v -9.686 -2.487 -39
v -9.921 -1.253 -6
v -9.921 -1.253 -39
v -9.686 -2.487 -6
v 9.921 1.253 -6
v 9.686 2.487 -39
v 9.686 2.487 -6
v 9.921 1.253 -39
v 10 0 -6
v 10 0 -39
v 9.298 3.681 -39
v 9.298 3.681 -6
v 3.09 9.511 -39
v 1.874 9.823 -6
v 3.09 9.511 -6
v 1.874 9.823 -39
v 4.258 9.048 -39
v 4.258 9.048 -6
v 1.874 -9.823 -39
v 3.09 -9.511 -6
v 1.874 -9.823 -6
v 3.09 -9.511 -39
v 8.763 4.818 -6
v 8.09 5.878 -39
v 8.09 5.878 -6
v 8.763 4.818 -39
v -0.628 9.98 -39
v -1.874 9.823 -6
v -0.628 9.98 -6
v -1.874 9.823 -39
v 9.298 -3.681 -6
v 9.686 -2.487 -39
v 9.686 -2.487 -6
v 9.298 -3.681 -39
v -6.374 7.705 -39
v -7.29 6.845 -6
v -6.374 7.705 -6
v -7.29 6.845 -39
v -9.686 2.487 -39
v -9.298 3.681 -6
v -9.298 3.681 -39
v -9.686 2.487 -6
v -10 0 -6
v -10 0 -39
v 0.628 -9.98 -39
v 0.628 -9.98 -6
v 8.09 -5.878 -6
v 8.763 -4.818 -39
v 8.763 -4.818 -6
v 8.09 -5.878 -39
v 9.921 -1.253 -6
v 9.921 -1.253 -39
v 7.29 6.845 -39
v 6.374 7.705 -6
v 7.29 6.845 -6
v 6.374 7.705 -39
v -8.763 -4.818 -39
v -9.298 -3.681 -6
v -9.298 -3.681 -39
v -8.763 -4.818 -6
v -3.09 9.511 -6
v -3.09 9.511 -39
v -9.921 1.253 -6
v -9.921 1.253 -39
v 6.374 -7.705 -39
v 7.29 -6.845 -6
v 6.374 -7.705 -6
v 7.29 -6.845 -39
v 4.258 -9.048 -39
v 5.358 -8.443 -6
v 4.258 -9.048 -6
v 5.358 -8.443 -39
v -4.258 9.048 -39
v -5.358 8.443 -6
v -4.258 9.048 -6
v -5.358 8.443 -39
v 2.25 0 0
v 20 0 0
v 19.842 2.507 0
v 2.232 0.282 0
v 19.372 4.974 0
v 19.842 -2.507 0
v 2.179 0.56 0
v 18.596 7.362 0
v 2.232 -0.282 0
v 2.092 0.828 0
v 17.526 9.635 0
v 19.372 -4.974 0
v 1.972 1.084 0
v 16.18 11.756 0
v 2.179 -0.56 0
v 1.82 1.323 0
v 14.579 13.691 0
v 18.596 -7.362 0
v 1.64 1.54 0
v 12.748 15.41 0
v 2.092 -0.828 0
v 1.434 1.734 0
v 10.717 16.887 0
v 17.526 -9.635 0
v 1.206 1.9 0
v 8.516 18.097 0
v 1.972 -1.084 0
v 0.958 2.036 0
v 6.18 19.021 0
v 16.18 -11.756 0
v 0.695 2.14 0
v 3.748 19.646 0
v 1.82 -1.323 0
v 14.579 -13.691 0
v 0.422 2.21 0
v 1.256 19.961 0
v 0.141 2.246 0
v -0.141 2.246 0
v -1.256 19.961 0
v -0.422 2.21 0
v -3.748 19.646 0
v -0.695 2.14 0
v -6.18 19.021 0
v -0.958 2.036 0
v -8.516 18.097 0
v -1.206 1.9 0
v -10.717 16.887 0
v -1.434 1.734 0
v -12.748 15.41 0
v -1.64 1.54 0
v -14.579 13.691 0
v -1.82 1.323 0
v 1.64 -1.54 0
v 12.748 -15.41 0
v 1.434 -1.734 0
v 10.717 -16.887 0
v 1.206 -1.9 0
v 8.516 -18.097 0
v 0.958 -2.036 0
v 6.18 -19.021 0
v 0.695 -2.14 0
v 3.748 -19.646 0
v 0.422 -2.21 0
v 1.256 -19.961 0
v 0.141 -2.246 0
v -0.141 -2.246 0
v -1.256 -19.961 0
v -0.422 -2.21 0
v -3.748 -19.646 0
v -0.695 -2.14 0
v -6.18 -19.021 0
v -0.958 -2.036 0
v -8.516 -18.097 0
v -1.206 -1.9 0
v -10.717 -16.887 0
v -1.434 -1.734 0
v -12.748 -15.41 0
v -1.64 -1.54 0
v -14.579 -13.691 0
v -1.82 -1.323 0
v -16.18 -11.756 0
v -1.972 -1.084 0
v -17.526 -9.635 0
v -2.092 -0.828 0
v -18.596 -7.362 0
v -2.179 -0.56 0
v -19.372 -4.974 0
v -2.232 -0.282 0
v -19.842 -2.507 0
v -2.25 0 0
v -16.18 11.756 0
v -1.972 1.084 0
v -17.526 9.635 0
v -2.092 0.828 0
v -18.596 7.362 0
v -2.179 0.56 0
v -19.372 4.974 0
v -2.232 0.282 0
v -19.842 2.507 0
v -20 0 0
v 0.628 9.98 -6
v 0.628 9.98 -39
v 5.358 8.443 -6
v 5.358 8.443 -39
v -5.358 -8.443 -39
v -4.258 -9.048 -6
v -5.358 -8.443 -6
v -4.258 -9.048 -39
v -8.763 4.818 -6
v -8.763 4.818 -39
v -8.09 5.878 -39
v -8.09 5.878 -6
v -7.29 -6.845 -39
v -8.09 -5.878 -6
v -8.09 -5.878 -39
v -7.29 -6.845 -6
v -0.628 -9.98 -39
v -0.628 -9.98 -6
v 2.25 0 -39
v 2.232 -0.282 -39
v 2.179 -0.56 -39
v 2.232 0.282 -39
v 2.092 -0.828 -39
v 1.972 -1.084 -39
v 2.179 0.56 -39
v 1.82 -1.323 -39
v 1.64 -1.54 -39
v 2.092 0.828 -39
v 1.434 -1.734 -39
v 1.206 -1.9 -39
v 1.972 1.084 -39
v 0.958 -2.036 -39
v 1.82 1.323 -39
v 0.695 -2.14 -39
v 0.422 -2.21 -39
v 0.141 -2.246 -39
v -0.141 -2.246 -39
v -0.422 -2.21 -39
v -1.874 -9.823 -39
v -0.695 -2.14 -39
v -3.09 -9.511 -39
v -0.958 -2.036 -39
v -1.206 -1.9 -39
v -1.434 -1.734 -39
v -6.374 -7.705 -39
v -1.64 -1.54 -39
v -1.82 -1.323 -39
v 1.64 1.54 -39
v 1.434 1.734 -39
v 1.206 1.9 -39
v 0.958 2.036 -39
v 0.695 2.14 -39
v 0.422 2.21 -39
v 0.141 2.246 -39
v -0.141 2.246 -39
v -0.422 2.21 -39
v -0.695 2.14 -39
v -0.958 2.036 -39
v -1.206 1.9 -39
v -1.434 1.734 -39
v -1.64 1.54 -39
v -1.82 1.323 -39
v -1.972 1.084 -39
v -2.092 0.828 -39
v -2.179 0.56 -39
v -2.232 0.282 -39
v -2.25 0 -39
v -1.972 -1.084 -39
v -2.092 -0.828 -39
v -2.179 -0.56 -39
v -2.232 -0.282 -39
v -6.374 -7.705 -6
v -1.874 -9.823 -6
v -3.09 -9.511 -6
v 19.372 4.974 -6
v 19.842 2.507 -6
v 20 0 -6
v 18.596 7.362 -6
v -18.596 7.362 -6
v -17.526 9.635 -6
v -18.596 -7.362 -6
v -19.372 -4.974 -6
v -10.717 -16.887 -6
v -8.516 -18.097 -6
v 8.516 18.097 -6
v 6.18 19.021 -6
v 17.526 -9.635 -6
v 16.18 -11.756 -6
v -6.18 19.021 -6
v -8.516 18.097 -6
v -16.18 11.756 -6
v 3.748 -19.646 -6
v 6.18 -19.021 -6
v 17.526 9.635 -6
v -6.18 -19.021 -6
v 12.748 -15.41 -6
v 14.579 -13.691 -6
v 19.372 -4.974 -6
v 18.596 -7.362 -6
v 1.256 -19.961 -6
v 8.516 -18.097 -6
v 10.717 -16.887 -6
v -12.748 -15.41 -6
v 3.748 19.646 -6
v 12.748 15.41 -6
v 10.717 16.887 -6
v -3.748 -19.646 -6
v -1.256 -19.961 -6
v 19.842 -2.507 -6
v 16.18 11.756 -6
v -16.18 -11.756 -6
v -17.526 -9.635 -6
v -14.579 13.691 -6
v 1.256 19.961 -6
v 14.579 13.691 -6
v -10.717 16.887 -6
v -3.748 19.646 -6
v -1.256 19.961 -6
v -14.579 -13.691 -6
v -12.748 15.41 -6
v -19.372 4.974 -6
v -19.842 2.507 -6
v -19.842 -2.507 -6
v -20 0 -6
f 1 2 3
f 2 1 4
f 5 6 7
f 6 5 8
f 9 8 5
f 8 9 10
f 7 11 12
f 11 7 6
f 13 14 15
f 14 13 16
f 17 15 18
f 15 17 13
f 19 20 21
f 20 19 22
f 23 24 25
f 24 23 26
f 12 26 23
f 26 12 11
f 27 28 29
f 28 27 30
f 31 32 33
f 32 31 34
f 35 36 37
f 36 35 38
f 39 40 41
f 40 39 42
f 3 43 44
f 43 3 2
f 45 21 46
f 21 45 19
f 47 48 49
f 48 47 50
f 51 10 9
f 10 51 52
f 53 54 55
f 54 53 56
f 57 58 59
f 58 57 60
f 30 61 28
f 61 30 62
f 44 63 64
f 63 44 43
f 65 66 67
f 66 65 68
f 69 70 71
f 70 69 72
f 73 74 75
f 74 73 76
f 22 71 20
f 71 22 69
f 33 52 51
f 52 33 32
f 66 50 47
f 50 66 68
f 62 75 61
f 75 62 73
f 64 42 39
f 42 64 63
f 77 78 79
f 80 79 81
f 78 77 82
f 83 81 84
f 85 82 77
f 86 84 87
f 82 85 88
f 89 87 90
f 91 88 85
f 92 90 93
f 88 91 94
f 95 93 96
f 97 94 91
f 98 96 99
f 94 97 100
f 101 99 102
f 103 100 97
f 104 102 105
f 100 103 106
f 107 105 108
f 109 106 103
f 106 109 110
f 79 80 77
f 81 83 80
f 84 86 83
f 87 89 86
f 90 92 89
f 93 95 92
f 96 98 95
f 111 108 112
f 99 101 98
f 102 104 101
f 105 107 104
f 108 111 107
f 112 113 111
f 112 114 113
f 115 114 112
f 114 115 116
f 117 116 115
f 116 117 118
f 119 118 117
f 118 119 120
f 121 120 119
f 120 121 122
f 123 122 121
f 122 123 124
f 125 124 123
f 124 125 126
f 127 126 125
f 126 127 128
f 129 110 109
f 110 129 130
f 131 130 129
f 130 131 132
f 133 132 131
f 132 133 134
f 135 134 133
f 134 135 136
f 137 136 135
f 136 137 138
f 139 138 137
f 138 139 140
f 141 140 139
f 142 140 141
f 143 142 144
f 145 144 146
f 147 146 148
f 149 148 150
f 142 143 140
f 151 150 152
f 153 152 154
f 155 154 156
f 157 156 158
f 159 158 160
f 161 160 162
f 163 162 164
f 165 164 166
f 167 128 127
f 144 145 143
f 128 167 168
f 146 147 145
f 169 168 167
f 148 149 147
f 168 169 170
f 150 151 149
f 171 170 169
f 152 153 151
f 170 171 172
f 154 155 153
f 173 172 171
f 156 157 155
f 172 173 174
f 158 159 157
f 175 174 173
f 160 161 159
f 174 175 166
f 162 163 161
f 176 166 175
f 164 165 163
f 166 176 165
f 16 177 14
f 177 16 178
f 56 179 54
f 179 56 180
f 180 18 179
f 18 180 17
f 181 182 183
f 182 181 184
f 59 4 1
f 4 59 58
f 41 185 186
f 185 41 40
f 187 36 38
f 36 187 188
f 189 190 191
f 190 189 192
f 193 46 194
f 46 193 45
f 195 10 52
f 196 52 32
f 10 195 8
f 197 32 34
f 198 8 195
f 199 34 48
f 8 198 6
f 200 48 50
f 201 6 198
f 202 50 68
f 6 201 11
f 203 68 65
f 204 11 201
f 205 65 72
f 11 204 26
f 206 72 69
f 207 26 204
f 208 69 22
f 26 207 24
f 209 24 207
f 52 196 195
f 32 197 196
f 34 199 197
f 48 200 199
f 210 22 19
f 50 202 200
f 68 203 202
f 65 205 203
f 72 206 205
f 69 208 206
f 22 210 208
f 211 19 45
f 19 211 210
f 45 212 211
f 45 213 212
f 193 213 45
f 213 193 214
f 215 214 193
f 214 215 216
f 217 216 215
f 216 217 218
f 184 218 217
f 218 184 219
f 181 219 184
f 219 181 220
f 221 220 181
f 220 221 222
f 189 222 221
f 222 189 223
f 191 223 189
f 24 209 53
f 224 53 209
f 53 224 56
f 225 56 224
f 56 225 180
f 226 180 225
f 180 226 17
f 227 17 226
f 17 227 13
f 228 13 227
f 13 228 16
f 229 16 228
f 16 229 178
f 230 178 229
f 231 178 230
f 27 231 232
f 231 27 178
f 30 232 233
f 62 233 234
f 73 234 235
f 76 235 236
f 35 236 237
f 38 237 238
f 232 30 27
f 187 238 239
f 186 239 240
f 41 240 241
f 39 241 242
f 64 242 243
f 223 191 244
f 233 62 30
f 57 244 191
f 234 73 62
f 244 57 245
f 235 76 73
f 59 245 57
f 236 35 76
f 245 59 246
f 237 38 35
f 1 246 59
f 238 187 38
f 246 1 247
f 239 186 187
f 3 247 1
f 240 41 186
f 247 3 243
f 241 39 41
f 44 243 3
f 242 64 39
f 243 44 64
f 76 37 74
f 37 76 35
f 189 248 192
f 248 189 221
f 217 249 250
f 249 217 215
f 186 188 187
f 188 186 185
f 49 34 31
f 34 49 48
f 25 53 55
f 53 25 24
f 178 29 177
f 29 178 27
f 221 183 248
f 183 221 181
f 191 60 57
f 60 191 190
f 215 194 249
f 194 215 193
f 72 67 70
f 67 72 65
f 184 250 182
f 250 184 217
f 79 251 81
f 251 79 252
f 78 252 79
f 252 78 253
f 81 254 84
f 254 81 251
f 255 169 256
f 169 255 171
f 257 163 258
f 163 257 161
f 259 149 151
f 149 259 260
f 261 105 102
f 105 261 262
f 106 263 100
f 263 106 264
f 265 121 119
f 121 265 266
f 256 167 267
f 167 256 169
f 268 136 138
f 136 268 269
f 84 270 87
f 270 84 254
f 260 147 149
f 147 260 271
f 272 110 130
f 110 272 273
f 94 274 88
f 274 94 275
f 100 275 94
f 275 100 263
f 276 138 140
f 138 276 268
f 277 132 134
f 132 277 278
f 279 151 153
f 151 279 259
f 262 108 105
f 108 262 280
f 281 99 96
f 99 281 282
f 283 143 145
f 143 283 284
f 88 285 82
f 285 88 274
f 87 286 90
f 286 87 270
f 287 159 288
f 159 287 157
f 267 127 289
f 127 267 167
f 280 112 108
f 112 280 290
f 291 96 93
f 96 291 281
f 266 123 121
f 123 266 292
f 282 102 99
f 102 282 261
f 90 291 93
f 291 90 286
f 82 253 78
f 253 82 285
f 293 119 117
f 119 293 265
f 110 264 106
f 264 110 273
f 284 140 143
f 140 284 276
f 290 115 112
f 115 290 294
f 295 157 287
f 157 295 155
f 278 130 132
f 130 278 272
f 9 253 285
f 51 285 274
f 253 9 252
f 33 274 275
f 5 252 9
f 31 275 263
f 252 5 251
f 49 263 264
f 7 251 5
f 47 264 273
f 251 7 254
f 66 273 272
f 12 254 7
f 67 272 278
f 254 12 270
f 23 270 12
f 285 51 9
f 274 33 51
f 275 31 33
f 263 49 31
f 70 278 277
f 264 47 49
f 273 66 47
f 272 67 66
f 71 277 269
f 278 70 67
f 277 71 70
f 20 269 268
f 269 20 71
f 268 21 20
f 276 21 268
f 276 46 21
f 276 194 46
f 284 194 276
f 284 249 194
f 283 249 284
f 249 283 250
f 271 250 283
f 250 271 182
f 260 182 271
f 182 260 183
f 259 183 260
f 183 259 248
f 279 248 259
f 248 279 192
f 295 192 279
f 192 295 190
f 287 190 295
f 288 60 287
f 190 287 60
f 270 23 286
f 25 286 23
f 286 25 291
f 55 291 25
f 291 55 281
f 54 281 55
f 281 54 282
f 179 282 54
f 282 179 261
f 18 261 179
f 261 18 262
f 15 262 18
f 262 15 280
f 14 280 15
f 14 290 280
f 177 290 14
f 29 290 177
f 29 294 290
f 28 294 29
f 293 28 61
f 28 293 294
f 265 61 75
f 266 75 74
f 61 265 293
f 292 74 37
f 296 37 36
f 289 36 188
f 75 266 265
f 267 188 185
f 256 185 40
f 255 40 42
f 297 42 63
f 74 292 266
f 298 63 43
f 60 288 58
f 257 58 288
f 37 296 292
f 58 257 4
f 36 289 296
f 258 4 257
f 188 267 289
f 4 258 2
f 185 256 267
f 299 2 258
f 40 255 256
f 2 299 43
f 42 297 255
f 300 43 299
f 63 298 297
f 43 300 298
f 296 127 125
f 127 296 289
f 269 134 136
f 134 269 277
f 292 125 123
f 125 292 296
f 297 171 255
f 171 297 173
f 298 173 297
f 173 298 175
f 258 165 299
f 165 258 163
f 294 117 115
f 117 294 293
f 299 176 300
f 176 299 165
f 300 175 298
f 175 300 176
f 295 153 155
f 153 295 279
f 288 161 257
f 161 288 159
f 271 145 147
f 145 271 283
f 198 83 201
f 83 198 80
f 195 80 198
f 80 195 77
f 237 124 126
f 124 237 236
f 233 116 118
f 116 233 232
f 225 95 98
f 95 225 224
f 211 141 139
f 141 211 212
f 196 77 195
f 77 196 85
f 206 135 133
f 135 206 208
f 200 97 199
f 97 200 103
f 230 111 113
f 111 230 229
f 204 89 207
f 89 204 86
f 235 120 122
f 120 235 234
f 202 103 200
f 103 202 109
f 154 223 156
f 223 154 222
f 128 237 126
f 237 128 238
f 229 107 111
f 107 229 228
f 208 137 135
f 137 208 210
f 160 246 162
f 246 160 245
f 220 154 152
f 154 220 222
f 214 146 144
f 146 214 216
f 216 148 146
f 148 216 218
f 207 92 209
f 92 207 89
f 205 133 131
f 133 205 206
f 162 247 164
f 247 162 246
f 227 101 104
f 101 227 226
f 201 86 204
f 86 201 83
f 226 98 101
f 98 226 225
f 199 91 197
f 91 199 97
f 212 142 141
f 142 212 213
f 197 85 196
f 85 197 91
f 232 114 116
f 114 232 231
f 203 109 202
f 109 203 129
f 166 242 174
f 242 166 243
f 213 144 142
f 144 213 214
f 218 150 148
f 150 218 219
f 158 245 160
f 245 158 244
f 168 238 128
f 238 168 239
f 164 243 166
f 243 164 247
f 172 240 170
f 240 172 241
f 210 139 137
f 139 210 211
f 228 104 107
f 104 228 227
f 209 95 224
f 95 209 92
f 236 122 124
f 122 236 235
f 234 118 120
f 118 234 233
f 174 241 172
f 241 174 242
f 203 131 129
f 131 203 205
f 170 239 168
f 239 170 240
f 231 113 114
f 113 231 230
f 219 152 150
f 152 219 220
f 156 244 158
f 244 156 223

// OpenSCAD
$fn = 50;


difference() {
	union() {
		translate(v = [0, 0, -39.0000000000]) {
			cylinder(h = 39, r = 10.0000000000);
		}
		translate(v = [0, 0, -6.0000000000]) {
			cylinder(h = 6, r = 20.0000000000);
		}
	}
	union() {
		#translate(v = [0, 0, -39]) {
			cylinder(h = 39, r = 2.2500000000);
		}
	}
}
